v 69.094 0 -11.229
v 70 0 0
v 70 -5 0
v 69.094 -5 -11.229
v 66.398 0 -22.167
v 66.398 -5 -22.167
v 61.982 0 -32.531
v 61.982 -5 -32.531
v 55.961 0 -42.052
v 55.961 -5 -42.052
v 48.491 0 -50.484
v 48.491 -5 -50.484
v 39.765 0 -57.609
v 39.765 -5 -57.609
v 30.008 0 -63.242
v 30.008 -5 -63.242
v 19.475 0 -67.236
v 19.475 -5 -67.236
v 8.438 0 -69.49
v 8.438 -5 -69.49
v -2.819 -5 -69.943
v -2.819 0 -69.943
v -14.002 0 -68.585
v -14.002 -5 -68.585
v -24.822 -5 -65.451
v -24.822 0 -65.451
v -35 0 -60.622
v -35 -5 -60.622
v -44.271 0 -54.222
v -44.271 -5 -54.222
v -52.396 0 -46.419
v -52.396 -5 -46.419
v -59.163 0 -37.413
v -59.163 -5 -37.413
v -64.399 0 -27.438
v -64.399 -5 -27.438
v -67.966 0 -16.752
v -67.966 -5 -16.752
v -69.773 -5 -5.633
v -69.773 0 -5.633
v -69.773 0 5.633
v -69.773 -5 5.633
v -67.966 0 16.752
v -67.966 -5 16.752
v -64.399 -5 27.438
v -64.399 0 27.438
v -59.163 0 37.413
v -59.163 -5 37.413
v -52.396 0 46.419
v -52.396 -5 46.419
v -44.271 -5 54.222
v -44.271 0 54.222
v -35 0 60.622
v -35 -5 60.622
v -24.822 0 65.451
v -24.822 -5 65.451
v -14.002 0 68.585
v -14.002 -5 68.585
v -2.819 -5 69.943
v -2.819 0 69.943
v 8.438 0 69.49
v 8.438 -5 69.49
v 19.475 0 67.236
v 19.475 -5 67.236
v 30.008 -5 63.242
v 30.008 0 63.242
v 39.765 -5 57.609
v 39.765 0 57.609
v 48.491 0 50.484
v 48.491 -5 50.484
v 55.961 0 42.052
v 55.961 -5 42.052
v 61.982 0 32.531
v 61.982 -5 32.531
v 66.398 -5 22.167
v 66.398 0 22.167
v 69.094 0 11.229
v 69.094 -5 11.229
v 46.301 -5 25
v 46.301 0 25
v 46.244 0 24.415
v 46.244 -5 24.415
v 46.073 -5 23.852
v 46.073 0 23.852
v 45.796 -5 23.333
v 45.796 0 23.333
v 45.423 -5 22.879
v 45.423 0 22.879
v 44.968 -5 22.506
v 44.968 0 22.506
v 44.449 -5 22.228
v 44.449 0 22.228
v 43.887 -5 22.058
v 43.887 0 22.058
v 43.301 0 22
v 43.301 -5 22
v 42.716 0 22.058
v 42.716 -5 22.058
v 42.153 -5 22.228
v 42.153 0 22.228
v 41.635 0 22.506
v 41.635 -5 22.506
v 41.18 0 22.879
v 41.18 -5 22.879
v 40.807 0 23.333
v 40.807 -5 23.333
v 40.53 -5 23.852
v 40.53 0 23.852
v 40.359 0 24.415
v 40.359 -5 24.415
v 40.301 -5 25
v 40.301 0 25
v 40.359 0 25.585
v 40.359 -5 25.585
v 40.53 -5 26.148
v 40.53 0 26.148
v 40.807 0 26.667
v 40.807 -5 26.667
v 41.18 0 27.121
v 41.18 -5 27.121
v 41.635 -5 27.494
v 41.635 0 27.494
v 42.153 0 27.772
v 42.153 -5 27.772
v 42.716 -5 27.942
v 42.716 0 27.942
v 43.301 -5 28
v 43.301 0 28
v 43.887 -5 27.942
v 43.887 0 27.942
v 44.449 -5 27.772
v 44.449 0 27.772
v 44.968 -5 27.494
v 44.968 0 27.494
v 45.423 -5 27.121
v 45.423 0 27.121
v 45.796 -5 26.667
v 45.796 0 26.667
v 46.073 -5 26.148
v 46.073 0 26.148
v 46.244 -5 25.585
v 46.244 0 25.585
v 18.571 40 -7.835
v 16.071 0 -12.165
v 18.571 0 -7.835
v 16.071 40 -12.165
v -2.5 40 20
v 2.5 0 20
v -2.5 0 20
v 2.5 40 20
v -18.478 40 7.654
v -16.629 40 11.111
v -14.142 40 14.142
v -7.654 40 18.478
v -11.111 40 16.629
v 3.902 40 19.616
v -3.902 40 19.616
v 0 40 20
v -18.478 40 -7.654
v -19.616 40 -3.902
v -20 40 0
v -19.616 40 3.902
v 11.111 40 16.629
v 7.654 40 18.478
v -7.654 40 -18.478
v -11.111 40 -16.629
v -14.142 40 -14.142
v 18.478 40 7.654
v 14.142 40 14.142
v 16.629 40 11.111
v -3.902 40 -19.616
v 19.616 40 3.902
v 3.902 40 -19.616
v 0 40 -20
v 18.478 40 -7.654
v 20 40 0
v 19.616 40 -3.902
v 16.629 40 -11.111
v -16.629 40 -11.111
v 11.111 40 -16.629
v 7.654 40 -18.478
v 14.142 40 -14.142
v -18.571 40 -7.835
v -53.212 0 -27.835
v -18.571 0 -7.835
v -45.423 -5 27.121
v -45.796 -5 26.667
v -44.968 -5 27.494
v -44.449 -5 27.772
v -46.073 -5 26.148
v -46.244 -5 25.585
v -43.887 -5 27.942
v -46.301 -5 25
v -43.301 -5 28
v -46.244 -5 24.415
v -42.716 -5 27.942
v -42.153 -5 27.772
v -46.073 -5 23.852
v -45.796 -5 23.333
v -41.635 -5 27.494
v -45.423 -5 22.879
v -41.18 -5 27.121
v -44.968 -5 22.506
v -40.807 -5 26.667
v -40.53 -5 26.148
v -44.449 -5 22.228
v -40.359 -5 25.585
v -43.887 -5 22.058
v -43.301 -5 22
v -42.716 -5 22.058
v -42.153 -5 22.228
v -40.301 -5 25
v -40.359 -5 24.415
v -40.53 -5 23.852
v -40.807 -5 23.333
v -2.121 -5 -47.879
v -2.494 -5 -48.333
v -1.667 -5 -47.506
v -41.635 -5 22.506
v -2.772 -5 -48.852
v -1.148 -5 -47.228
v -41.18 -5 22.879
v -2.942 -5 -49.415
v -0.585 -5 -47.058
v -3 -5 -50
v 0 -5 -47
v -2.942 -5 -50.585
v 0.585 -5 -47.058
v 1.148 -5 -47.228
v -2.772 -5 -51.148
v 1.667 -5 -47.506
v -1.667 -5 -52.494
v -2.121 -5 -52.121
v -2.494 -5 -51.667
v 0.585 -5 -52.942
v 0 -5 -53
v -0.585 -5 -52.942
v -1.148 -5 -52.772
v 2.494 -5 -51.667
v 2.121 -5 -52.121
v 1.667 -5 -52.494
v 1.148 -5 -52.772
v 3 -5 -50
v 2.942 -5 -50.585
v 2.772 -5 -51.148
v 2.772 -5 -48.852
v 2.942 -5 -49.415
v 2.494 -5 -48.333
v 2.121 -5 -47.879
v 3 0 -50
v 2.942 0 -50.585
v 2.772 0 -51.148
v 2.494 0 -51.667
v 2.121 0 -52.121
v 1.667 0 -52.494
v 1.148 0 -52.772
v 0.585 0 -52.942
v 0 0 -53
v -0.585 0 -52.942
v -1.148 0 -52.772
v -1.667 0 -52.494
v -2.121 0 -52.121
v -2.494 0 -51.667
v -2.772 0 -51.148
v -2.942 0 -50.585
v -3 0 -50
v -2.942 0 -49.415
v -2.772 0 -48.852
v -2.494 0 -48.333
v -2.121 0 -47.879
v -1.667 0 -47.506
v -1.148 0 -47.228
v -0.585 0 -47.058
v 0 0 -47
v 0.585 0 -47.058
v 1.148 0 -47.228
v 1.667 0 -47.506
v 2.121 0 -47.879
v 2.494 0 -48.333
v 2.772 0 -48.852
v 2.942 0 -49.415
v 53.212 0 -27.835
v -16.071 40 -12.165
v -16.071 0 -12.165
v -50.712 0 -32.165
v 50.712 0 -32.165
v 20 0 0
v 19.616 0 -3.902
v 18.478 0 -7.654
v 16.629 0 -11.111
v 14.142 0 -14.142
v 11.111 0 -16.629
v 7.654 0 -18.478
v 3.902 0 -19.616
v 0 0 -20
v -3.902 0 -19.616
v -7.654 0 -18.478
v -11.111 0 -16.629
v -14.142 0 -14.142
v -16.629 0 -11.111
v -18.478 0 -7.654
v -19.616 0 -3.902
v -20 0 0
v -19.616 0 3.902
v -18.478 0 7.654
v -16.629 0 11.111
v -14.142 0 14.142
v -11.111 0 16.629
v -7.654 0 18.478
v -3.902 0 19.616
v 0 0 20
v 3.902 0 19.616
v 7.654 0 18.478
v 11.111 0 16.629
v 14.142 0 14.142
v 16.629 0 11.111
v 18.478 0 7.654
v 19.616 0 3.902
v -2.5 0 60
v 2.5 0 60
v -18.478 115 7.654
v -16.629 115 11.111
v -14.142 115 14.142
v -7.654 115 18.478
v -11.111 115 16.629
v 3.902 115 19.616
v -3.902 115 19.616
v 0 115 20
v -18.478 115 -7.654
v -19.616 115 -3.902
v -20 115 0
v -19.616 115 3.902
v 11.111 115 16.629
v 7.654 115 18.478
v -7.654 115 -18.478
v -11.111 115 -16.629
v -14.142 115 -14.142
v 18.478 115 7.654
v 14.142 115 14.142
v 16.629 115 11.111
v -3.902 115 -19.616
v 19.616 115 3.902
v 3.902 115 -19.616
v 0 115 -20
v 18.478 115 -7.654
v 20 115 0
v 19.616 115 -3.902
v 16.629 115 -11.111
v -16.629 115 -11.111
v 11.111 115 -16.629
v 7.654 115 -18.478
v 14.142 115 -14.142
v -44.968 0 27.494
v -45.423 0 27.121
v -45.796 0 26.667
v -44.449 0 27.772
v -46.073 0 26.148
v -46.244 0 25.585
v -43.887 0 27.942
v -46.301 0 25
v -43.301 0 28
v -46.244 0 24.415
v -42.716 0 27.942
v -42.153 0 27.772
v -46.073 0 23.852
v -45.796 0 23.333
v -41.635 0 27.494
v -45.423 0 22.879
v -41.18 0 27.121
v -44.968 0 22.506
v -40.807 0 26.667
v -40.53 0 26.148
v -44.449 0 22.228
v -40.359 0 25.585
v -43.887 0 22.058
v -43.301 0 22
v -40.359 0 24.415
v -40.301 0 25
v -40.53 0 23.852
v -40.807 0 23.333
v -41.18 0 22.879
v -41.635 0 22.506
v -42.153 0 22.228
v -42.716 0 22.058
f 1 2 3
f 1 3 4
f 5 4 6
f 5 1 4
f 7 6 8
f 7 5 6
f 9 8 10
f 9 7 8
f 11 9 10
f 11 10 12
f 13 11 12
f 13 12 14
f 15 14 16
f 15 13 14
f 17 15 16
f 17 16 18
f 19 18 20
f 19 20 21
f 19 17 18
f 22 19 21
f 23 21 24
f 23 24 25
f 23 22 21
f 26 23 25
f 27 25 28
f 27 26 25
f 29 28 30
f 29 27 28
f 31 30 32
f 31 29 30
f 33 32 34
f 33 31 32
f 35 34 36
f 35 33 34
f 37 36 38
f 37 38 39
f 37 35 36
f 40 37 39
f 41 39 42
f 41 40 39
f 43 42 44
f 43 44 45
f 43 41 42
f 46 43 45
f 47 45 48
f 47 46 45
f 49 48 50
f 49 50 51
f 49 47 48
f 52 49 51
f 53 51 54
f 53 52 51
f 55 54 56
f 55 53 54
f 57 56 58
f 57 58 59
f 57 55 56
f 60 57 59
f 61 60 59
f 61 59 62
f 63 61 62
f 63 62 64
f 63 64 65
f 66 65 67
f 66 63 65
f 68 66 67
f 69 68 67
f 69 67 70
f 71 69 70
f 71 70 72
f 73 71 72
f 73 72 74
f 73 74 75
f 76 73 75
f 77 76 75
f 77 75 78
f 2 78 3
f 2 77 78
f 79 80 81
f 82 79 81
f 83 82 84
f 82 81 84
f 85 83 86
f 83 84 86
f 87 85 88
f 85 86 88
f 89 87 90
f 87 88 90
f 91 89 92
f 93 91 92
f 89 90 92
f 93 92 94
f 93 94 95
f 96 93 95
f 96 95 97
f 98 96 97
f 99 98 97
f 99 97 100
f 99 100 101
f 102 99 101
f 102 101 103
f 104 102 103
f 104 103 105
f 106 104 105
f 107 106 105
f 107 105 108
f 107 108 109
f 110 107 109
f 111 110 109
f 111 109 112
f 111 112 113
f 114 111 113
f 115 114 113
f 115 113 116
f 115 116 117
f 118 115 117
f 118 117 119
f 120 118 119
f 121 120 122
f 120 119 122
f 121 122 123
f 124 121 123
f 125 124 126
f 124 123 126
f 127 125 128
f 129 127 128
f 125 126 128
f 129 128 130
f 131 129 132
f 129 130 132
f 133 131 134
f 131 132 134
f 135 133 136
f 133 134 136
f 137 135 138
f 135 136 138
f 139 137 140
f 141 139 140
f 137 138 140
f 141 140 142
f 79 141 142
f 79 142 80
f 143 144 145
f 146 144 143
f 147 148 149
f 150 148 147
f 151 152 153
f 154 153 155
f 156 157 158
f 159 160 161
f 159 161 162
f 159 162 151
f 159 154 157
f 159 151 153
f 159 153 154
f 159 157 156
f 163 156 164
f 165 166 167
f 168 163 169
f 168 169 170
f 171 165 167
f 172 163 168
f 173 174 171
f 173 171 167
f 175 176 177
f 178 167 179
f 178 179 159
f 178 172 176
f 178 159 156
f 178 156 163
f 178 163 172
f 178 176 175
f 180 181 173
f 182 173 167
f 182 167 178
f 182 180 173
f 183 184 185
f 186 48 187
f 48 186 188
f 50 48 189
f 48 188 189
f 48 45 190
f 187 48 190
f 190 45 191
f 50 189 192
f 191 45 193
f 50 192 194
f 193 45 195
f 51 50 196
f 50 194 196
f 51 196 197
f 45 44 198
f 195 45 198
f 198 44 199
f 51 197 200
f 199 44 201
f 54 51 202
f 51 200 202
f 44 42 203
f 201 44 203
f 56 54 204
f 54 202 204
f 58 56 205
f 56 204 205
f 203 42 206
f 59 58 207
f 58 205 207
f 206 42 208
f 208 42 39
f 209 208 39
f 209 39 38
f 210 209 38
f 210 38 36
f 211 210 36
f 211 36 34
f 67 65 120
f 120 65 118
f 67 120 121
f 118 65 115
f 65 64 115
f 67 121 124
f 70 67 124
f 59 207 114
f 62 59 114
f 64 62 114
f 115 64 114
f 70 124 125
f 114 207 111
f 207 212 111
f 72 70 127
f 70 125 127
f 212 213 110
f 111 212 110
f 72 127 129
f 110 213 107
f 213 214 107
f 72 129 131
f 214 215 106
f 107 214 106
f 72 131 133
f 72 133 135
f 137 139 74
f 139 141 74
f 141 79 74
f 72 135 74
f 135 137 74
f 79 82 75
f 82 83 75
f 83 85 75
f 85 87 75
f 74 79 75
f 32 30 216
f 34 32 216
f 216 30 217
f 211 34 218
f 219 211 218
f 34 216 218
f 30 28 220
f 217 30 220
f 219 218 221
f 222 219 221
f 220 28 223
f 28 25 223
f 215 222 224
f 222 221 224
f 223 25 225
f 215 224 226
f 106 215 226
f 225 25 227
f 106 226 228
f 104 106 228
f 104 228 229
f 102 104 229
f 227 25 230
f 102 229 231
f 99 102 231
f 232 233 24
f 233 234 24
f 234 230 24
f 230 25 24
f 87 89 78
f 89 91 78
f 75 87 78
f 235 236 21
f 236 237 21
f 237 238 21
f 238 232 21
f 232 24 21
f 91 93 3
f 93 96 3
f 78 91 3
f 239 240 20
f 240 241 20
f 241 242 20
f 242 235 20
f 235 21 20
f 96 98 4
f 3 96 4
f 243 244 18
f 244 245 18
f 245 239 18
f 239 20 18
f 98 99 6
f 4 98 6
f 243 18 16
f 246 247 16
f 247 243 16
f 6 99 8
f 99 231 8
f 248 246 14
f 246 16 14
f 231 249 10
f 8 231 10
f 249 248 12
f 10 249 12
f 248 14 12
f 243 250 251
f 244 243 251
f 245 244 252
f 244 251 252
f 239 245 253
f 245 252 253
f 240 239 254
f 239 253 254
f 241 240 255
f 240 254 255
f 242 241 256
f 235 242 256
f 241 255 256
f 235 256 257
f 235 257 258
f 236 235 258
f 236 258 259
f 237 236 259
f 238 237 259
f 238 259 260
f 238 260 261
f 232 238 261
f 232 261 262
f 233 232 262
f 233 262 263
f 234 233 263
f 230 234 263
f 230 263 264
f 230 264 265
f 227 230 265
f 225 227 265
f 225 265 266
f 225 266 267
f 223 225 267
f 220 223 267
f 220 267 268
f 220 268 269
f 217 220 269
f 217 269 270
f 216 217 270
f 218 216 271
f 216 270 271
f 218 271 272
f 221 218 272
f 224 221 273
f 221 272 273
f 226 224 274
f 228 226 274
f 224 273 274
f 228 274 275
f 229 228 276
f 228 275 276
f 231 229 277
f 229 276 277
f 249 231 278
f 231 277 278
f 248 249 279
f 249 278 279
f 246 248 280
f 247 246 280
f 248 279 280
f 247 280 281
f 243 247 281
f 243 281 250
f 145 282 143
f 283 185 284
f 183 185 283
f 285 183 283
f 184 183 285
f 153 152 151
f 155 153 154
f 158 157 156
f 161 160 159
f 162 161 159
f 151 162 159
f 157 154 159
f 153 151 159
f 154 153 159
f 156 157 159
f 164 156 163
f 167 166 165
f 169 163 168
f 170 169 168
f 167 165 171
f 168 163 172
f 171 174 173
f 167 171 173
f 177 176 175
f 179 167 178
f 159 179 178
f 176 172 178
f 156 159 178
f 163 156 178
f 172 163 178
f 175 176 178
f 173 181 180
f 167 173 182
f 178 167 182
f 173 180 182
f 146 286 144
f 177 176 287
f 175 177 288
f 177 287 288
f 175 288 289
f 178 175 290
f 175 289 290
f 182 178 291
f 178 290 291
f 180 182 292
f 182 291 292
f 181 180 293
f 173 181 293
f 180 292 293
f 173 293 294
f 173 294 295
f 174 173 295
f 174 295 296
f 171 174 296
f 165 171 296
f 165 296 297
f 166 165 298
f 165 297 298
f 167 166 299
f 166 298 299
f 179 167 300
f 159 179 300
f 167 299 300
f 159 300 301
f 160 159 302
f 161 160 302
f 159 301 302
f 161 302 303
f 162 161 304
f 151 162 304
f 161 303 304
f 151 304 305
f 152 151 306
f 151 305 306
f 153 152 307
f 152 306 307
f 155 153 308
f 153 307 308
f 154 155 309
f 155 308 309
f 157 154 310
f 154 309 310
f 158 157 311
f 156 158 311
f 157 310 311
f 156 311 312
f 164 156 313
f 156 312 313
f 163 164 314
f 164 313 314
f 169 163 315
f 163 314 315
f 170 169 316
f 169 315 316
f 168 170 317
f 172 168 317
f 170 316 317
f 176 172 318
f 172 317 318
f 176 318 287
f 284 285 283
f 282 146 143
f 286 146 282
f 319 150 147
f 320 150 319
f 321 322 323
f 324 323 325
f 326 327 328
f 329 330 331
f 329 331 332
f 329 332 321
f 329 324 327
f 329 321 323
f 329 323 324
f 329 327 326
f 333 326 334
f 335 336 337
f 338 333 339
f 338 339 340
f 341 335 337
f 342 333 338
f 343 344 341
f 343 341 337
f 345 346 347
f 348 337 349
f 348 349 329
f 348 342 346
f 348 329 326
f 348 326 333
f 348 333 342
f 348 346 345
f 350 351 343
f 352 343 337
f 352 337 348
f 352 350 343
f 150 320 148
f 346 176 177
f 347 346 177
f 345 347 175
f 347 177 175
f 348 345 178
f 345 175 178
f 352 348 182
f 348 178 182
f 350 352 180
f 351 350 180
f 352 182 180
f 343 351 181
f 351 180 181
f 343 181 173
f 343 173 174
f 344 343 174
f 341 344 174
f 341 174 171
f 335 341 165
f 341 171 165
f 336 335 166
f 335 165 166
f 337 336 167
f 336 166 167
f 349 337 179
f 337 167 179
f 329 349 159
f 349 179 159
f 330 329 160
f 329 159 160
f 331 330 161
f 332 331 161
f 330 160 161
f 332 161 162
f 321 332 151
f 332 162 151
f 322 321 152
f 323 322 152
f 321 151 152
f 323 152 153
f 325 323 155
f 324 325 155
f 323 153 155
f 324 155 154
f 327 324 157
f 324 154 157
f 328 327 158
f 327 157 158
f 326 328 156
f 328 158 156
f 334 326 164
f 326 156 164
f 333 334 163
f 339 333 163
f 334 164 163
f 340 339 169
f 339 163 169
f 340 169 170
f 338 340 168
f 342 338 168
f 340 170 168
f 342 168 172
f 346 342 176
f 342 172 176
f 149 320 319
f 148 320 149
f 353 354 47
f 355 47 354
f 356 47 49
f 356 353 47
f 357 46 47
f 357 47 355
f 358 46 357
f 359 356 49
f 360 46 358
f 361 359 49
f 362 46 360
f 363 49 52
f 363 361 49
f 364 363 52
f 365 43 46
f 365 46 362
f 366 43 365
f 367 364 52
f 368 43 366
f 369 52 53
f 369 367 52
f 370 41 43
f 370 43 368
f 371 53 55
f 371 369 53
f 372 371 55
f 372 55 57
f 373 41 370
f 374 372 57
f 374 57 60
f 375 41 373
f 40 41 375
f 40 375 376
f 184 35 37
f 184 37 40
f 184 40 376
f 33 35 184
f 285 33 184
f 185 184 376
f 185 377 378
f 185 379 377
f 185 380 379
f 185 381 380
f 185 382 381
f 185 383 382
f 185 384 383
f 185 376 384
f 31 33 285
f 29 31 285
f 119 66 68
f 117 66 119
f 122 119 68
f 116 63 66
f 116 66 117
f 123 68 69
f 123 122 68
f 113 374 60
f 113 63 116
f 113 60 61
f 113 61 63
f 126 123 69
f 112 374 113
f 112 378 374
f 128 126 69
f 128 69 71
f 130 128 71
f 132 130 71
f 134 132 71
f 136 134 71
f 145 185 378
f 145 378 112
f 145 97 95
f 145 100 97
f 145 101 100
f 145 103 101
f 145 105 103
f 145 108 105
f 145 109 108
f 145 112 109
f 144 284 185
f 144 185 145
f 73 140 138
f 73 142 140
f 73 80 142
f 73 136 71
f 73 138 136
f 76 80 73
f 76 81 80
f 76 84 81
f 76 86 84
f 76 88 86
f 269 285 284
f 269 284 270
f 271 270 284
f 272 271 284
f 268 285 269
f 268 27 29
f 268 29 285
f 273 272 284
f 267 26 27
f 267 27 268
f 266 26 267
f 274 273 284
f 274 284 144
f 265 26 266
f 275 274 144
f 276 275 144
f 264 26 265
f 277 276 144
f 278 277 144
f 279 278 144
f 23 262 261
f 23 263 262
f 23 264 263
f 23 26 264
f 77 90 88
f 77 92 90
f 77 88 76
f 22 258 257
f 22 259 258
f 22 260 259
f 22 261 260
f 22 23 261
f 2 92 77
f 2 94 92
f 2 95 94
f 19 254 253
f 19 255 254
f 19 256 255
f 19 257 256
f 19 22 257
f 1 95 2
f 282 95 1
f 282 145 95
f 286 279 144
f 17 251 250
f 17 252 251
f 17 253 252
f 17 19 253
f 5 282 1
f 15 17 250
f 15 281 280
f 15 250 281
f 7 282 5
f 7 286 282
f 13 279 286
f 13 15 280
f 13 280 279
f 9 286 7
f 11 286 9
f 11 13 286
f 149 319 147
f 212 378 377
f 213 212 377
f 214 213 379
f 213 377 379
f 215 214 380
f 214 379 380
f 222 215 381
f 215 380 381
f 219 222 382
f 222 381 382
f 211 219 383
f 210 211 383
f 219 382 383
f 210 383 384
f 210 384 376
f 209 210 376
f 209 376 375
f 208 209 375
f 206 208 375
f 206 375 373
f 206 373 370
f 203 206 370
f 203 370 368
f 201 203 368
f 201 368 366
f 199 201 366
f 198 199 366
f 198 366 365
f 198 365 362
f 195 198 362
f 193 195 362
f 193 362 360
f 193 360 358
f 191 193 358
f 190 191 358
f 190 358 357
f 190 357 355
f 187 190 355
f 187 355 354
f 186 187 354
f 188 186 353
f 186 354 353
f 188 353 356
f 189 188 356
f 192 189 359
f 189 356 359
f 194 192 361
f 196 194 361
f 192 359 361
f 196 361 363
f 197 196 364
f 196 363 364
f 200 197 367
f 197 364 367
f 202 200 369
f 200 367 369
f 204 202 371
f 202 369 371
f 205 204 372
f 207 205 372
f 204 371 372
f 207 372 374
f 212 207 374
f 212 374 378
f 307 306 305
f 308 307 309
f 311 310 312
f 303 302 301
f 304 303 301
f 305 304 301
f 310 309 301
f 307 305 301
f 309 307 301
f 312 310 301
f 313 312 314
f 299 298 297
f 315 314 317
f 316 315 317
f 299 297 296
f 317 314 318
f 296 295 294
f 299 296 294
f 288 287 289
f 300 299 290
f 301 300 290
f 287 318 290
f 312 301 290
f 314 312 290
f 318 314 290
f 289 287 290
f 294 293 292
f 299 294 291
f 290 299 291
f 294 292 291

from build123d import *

# Parameters (mm, degrees)
SKETCH1_R           = 70
BOSS_EXTRUDE1_DEPTH = 5
SKETCH2_R           = 20
BOSS_EXTRUDE2_DEPTH = 40
SKETCH3_R           = 20
BOSS_EXTRUDE3_DEPTH = 75
BOSS_EXTRUDE4_DEPTH = 2.5
CIRPATTERN1_COUNT   = 3
SKETCH5_R           = 3
CUT_EXTRUDE1_DEPTH  = 152.739909055


with BuildPart() as part:
    # Sketch1 → Boss-Extrude1 (new body)
    with BuildSketch(Plane(origin=(0, 0, 0), x_dir=(1, 0, 0), z_dir=(0, 1, 0))):
        Circle(SKETCH1_R)
    extrude(amount=-BOSS_EXTRUDE1_DEPTH)


with BuildPart() as body_2:
    # Sketch2 → Boss-Extrude2 (new body)
    with BuildSketch(Plane(origin=(0, 0, 0), x_dir=(1, 0, 0), z_dir=(0, 1, 0))):
        Circle(SKETCH2_R)
    extrude(amount=BOSS_EXTRUDE2_DEPTH)


with BuildPart() as body_3:
    # Sketch3 → Boss-Extrude3 (new body)
    with BuildSketch(Plane(origin=(0, 40, 0), x_dir=(1, 0, 0), z_dir=(0, 1, 0))):
        Circle(SKETCH3_R)
    extrude(amount=BOSS_EXTRUDE3_DEPTH)


with BuildPart() as body_4:
    # Sketch4 → Boss-Extrude4 (new, symmetric)
    with BuildSketch(Plane(origin=(0, 0, 0), x_dir=(0, 0, -1), z_dir=(1, 0, 0))):
        Polygon((-60, 0), (-20, 0), (-20, 40), align=None)
    boss_extrude4 = extrude(amount=BOSS_EXTRUDE4_DEPTH, both=True)


with BuildPart() as part_1:
    add(part.part)

    # CirPattern1: Boss-Extrude4 ×3 about axis
    cirpattern1_axis = Axis((0, 40, 0), (0, -1, 0))
    for i in range(1, CIRPATTERN1_COUNT):
        add(boss_extrude4.rotate(cirpattern1_axis, i * 360 / CIRPATTERN1_COUNT))

    # Sketch5 → Cut-Extrude1 (cut, through all)
    with BuildSketch(Plane(origin=(0, 0, 0), x_dir=(1, 0, 0), z_dir=(0, 1, 0))):
        with Locations((-43.301270189, -25)):
            Circle(SKETCH5_R)
        with Locations((0, 50)):
            Circle(SKETCH5_R)
        with Locations((43.301270189, -25)):
            Circle(SKETCH5_R)
    extrude(amount=-CUT_EXTRUDE1_DEPTH, mode=Mode.SUBTRACT)


solid = Compound([body_2.part, body_3.part, body_4.part, part_1.part])
